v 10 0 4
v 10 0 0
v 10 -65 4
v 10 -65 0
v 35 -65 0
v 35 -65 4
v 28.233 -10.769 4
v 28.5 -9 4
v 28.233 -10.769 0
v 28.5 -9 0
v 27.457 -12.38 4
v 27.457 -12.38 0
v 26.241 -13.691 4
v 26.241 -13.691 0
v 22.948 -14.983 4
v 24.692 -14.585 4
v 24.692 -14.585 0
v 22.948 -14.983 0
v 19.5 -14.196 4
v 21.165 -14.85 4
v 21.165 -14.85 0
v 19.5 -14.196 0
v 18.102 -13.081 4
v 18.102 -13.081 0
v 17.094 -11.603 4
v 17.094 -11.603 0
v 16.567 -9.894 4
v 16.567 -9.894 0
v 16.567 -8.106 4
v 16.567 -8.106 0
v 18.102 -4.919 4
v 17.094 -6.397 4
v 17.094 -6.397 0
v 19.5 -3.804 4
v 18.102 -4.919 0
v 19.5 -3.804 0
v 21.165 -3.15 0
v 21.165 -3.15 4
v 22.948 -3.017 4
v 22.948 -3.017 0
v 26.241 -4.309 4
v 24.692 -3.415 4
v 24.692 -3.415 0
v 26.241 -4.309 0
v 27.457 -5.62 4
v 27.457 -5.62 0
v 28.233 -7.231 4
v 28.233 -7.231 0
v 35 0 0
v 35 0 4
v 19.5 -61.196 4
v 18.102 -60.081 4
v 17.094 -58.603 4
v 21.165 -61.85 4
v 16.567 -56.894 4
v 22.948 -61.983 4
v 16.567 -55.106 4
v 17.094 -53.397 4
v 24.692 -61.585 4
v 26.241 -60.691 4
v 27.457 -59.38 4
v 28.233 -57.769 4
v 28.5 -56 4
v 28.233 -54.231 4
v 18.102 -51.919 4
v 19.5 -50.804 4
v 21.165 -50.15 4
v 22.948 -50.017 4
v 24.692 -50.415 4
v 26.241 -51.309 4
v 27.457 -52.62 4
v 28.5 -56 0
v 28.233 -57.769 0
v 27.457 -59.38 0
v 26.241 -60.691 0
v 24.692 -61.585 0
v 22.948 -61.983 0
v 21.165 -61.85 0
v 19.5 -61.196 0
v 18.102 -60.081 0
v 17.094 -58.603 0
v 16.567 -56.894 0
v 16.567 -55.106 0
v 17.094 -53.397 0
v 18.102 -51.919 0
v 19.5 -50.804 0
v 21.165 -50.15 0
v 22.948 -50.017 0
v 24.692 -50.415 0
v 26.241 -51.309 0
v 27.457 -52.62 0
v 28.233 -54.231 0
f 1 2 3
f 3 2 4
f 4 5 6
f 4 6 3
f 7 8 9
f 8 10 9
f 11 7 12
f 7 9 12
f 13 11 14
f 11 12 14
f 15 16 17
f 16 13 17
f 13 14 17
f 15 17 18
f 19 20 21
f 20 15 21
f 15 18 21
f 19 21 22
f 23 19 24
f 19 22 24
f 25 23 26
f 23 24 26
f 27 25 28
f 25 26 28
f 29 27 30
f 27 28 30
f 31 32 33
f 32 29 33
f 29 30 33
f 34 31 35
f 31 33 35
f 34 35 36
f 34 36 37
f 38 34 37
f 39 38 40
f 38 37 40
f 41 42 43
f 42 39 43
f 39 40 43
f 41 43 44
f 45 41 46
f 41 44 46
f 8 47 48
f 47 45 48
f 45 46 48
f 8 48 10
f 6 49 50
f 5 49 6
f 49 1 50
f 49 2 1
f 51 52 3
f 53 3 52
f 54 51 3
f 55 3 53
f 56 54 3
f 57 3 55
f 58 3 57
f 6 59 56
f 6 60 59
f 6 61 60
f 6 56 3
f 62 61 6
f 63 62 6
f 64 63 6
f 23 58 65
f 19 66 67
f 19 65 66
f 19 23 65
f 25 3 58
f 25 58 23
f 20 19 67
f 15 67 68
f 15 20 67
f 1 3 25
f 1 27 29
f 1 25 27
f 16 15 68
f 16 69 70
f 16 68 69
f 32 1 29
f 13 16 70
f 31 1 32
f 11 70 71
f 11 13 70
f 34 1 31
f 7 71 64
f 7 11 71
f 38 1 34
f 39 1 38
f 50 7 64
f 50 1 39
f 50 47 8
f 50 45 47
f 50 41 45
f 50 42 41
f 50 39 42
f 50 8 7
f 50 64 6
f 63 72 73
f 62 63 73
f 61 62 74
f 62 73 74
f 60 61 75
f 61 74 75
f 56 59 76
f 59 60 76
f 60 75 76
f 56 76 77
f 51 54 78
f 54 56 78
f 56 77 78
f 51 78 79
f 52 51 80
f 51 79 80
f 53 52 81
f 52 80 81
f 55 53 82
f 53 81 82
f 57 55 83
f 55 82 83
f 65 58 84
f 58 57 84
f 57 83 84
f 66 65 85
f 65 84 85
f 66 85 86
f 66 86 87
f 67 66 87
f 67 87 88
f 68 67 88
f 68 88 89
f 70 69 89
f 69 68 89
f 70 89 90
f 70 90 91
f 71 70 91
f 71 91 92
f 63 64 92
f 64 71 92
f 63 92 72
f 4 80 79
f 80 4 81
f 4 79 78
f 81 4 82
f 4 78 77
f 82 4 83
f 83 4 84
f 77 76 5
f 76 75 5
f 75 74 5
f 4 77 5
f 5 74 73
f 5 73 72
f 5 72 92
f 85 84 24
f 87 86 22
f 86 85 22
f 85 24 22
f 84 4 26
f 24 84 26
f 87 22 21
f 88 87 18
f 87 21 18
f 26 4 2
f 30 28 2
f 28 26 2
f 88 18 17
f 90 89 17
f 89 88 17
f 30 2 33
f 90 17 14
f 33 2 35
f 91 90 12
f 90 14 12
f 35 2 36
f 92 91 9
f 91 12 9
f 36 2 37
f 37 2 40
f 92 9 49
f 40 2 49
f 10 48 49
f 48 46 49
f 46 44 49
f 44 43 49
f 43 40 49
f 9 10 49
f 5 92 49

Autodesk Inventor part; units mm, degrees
ref_plane "YZ Plane" through (0, 0, 0) normal (1, 0, 0) x (0, 1, 0)
ref_plane "XZ Plane" through (0, 0, 0) normal (0, 1, 0) x (-1, 0, 0)
ref_plane "XY Plane" through (0, 0, 0) normal (0, 0, 1) x (1, 0, 0)
sketch "Sketch1" plane through (0, 0, 0) normal (0, 0, 1) x (1, 0, 0)
  line L0 (0, 0) -> (45, 0)
  line L1 (45, 0) -> (45, -65)
  line L2 (45, -65) -> (0, -65)
  line L3 (0, -65) -> (0, 0)
  line L4 (45, 15.0081) -> (45, -81.3497) construction
  line L5 (22.5, 15.0081) -> (22.5, -81.3497) construction
  line L6 (80.9794, 0) -> (-24.1636, 0) construction
  line L7 (80.9794, -9) -> (-24.1636, -9) construction
  circle A0 centre (22.5, -9) radius 6
  line L8 (91.2527, -65) -> (-31.7655, -65) construction
  line L9 (91.2527, -56) -> (-31.7655, -56) construction
  circle A1 centre (22.5, -56) radius 6
  line L10 (0, 6.8812) -> (0, -100.7793) construction
  line L11 (10, 6.8812) -> (10, -100.7793)
  line L12 (35, 15.0081) -> (35, -81.3497)
  point P0 (35, -65)
  point P1 (35, 0)
  point P2 (10, 0)
  point P3 (10, -65)
  dimension "d0" = 45
  dimension "d1" = 65
  dimension "d2" = 22.5
  dimension "d3" = 9
  dimension "d4" = 12
  dimension "d5" = 9
  dimension "d6" = 12
  dimension "d9" = 10
  dimension "d10" = 10
extrude "Extrusion2" add sketch "Sketch1" along normal blind 4 contours L0 L12 L2 L11
properties part number "Hook-Extension" material "Steel, Mild"
